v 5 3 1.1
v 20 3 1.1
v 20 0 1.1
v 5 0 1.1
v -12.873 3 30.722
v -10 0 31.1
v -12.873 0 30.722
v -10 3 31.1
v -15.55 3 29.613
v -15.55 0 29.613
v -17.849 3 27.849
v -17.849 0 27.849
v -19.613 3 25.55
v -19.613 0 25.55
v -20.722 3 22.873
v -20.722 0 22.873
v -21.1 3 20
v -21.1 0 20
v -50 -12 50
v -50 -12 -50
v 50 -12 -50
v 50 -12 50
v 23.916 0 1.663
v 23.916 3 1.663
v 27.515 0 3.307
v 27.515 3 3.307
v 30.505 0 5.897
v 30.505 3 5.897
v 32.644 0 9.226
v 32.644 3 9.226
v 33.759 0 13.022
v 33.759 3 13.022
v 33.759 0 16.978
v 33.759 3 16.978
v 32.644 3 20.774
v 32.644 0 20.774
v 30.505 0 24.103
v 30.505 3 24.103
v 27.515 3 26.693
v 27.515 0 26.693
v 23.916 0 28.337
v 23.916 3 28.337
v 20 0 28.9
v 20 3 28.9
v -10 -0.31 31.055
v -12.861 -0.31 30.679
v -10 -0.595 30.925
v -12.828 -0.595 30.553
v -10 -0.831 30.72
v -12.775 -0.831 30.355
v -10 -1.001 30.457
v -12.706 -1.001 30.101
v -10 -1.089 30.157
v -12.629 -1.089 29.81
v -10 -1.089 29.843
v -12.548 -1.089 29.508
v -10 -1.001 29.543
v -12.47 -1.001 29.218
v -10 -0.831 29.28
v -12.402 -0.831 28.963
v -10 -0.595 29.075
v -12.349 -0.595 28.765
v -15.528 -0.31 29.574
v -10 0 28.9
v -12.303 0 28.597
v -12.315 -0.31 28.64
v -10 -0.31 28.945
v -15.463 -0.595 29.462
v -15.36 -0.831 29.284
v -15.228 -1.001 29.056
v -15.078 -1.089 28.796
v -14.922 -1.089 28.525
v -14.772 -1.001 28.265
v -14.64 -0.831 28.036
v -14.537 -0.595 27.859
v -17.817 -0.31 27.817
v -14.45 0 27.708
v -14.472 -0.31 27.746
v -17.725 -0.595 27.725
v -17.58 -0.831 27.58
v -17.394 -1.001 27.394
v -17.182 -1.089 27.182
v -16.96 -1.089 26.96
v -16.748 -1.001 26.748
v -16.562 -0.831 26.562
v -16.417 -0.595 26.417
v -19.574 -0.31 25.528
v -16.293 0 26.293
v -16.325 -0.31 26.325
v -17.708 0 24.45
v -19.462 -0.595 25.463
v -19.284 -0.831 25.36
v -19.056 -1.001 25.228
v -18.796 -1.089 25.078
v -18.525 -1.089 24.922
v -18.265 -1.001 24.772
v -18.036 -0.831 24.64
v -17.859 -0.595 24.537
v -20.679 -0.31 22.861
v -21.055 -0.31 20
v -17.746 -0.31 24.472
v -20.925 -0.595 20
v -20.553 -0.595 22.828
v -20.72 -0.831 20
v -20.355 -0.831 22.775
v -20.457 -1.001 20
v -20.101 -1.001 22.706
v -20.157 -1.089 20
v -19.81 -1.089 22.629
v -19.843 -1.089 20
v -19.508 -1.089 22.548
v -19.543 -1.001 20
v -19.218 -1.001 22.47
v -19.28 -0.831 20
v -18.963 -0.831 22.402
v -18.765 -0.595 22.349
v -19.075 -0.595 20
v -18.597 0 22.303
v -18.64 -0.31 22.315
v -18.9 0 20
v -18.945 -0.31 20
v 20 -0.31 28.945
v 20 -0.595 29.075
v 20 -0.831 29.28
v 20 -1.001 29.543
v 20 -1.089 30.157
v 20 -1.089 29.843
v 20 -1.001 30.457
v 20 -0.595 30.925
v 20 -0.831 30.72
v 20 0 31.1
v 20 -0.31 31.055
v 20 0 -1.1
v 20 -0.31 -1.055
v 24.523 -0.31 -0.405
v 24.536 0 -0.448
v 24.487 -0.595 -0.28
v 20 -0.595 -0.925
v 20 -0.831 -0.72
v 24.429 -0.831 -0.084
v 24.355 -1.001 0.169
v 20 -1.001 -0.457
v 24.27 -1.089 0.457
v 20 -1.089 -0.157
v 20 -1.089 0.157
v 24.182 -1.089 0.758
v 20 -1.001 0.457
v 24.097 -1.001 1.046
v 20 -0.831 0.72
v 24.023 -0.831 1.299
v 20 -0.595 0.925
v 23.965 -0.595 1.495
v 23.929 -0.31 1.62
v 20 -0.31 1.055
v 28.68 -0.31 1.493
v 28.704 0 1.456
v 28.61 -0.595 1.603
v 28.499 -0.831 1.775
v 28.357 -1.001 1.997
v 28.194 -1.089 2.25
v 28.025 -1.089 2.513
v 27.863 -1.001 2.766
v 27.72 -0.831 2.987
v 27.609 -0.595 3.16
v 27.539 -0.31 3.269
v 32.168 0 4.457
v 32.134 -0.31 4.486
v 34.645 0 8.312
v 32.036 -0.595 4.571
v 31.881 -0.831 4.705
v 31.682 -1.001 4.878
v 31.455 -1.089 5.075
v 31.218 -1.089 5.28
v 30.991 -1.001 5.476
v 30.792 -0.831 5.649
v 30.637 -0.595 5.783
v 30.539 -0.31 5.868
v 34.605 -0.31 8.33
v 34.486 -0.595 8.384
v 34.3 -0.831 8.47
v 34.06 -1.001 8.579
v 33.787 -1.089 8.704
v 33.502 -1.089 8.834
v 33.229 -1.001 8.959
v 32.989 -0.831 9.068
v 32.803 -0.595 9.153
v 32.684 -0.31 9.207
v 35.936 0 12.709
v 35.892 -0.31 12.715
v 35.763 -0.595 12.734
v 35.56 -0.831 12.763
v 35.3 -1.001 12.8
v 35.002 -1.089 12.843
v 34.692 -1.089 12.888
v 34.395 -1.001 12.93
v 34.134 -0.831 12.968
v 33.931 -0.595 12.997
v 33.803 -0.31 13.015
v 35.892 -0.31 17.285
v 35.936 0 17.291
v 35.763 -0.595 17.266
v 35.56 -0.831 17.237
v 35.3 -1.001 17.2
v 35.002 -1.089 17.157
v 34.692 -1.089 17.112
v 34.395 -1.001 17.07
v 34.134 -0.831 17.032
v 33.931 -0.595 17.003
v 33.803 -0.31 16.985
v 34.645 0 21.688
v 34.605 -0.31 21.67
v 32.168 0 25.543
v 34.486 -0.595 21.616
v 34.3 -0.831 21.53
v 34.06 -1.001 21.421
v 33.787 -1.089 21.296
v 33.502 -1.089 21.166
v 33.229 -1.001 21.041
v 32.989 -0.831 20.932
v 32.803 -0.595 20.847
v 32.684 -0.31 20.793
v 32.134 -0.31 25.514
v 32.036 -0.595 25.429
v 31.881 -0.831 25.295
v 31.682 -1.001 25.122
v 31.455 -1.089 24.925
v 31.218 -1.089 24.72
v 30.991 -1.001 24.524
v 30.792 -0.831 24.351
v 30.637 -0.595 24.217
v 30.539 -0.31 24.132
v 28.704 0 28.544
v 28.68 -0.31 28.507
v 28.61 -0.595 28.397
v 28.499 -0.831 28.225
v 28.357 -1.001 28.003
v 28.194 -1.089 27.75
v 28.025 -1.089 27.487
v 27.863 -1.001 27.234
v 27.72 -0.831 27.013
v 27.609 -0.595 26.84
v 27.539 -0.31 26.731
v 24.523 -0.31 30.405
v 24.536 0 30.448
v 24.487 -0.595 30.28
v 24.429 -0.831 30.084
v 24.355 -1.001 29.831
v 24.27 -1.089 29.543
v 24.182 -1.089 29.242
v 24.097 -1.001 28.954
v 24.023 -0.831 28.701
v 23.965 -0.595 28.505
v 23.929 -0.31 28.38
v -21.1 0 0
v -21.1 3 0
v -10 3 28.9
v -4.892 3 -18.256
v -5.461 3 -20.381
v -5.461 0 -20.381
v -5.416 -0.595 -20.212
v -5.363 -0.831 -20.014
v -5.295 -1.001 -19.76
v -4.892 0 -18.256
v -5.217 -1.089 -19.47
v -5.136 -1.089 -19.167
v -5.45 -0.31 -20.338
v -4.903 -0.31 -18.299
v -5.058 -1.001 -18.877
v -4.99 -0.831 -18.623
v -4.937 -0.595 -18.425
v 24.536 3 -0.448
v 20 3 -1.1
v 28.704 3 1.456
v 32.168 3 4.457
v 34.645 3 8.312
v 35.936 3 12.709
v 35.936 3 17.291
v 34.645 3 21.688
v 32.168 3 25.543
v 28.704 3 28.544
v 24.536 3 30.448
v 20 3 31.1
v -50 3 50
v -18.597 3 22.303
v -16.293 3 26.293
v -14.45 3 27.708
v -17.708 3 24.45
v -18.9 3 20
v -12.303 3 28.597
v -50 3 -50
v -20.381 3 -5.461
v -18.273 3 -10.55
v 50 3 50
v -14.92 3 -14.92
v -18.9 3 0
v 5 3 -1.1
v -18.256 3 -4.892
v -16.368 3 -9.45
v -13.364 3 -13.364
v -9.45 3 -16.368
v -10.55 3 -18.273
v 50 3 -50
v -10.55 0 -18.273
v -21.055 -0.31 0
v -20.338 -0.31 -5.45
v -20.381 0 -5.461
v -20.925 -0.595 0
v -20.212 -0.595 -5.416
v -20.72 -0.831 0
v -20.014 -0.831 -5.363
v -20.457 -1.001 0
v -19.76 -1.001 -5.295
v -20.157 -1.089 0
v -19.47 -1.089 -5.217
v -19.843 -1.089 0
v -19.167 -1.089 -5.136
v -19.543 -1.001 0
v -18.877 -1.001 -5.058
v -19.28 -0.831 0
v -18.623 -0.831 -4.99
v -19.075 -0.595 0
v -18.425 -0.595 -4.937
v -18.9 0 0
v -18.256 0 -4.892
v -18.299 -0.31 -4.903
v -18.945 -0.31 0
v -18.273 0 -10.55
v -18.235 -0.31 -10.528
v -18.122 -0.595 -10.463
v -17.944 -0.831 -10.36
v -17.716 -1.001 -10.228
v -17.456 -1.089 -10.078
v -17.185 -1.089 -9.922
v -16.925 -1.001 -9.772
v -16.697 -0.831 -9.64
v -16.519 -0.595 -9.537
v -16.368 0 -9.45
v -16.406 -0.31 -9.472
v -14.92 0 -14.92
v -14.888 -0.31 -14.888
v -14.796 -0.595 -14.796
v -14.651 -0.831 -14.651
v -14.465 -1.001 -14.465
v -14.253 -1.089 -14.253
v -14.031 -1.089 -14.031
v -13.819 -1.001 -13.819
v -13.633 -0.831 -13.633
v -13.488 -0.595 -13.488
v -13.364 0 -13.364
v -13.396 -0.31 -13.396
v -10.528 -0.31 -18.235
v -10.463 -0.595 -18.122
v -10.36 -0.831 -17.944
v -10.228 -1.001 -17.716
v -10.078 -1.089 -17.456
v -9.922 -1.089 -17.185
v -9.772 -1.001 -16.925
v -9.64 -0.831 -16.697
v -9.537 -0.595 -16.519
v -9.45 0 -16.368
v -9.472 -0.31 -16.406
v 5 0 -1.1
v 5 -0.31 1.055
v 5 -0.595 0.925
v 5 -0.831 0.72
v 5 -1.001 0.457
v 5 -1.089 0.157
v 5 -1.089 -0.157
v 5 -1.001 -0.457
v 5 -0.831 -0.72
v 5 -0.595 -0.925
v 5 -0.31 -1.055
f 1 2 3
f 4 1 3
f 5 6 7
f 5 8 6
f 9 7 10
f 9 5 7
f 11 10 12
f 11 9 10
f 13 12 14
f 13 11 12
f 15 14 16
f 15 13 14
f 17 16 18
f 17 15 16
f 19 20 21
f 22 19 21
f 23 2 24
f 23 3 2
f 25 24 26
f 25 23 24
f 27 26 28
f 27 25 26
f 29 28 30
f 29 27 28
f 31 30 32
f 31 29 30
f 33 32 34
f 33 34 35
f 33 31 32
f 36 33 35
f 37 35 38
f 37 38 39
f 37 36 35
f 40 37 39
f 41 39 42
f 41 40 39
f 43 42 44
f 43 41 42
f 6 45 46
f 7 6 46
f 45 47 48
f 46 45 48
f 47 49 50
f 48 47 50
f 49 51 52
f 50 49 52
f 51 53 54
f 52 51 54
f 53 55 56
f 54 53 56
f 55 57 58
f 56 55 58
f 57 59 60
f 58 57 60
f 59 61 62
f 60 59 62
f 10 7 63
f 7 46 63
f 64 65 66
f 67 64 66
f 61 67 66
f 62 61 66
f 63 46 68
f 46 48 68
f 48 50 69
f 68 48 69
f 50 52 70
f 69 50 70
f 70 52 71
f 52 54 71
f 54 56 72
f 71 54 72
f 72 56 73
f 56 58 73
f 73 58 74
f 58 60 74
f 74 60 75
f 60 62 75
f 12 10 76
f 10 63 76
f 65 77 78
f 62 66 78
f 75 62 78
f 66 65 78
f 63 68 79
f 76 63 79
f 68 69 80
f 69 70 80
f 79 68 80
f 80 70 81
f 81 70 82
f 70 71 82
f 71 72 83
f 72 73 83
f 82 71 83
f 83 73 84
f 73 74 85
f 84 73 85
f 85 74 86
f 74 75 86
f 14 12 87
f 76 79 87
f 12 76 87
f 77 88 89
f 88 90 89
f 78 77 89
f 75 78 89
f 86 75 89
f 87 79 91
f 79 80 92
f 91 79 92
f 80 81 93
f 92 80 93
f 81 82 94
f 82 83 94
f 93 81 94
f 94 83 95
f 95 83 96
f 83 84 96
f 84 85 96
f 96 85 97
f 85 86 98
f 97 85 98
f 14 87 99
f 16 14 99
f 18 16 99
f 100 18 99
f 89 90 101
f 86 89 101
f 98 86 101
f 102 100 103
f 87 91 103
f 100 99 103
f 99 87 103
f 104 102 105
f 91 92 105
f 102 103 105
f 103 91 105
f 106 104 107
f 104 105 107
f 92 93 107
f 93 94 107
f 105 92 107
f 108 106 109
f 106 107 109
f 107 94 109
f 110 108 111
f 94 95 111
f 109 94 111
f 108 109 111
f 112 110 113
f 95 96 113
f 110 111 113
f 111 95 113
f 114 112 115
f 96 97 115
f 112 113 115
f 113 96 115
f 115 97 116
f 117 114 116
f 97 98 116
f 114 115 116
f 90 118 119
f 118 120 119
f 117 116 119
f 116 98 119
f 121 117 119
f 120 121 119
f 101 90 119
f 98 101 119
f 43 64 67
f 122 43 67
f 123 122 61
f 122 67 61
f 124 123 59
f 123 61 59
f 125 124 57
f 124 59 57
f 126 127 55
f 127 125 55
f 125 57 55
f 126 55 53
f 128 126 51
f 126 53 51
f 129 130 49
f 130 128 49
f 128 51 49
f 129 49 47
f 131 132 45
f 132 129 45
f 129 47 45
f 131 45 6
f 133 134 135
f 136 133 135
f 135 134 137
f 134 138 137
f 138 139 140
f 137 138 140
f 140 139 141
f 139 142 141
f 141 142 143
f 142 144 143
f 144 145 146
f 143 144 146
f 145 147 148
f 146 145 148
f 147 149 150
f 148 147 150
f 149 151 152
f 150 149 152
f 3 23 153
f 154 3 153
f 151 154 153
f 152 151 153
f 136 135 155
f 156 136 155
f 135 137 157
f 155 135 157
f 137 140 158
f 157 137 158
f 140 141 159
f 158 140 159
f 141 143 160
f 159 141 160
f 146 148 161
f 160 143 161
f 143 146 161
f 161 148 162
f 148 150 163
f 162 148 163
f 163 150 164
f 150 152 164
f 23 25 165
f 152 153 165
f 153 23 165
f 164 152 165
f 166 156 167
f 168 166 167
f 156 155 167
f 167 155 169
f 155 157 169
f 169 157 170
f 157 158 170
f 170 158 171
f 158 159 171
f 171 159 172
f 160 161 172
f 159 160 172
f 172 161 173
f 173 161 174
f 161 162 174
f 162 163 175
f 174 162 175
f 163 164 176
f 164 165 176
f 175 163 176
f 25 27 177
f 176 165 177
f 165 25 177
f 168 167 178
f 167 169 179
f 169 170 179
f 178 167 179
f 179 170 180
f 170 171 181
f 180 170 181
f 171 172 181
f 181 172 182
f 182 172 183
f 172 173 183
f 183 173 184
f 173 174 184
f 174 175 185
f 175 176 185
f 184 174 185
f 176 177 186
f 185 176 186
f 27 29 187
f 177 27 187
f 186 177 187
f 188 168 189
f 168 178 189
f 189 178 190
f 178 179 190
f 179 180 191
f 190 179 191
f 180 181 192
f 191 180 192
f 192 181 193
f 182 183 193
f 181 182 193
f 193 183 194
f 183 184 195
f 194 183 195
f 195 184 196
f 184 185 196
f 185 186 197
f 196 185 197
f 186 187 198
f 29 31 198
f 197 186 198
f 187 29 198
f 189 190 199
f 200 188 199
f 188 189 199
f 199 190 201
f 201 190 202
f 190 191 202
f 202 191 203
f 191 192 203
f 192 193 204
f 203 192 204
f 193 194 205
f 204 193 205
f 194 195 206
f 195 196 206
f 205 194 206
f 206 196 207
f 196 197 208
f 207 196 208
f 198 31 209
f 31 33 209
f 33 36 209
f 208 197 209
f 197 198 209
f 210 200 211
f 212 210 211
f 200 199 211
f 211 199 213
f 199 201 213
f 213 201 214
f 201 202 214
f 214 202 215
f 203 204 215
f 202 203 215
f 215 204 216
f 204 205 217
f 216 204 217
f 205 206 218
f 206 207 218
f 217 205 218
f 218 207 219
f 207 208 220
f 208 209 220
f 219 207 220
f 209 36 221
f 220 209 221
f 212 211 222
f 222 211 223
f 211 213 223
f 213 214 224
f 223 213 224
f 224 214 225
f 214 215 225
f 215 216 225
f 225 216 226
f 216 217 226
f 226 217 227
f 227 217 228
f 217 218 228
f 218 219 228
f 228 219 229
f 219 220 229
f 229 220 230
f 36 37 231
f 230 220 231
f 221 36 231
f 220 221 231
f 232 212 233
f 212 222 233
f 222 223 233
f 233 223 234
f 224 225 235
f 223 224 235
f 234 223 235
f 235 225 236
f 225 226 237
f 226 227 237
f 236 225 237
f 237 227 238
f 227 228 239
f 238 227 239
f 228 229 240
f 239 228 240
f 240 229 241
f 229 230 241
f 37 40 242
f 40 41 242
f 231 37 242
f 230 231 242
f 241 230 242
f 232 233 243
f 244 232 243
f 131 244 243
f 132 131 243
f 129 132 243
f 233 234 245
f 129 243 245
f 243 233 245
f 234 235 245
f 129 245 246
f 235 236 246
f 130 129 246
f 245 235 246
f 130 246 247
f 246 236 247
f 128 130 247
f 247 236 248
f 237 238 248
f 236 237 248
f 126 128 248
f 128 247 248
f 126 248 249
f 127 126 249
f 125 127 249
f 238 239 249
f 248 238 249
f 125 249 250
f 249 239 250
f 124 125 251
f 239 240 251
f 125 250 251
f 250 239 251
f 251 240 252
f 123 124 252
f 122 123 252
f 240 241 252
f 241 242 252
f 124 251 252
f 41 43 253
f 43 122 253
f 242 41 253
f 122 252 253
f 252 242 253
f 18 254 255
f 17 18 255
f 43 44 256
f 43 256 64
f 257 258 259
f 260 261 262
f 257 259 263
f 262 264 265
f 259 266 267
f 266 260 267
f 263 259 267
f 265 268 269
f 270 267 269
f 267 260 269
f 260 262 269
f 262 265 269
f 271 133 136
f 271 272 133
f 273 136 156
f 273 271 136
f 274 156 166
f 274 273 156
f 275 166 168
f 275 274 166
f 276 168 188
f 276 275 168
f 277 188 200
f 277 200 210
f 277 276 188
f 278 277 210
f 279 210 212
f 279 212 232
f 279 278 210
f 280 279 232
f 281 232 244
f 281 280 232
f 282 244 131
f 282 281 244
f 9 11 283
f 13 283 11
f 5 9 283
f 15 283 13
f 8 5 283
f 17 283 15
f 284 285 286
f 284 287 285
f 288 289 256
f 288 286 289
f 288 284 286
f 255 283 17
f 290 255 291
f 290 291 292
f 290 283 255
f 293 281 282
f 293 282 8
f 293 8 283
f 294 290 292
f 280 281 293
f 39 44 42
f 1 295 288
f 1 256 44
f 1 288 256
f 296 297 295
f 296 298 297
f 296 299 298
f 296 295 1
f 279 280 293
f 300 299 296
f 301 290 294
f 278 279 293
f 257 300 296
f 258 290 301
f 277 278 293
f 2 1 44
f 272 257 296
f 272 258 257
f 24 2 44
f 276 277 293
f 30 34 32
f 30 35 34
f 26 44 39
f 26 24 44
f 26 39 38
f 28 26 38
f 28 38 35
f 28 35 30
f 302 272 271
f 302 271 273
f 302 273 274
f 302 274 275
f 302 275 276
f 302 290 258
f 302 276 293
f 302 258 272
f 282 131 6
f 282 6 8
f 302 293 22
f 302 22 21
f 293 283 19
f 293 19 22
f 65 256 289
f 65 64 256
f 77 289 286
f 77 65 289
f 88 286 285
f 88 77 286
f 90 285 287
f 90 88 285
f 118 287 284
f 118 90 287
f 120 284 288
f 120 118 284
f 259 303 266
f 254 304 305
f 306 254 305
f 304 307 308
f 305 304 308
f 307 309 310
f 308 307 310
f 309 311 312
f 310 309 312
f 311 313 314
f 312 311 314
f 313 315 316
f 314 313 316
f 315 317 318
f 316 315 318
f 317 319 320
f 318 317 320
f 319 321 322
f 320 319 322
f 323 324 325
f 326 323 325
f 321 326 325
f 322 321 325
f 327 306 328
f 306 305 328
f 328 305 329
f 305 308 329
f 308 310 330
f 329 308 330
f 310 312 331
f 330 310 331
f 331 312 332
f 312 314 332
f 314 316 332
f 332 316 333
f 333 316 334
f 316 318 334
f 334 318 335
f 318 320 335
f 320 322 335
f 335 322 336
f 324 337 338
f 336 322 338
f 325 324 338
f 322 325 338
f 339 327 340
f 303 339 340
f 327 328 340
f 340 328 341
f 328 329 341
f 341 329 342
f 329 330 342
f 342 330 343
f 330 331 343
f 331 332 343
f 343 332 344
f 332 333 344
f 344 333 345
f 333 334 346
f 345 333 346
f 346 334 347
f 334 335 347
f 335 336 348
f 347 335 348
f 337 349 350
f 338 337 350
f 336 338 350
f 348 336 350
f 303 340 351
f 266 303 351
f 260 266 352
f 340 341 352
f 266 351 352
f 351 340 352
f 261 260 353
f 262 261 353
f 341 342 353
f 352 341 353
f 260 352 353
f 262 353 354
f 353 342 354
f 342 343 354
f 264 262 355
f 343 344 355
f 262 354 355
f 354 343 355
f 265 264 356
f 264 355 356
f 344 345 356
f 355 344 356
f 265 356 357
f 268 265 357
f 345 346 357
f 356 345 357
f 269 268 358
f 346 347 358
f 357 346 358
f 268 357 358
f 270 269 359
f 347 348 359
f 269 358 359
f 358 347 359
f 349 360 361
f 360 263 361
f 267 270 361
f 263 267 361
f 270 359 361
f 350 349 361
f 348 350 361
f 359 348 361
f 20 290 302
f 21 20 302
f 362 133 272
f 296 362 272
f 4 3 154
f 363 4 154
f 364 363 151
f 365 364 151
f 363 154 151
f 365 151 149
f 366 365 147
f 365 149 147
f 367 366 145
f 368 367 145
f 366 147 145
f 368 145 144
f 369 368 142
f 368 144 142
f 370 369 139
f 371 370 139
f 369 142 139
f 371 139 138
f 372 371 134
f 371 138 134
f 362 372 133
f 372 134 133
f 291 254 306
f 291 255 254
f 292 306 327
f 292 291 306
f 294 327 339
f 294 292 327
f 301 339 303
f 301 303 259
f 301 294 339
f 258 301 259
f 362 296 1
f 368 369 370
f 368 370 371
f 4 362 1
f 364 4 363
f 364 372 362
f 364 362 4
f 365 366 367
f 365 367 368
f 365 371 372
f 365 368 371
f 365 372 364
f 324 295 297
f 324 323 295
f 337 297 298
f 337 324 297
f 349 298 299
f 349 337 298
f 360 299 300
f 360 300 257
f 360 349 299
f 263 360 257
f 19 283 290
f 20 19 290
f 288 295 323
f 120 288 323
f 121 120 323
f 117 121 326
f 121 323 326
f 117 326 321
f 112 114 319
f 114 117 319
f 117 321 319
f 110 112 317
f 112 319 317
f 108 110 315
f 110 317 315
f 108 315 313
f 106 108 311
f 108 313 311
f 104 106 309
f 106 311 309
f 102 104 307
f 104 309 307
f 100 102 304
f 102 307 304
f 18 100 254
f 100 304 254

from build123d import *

# Parameters (mm, degrees)
AUFSATZ_LINEAR_START            = 3
SKIZZE4_W                       = 100
SKIZZE4_H                       = 100
AUFSATZ_LINEAR_AUSTRAGEN1_DEPTH = 15


with BuildPart() as part:
    # Skizze4 → Aufsatz-Linear austragen1 (new body)
    with BuildSketch(Plane(origin=(0, 0, 0), x_dir=(1, 0, 0), z_dir=(0, 1, 0)).offset(AUFSATZ_LINEAR_START)):
        Rectangle(SKIZZE4_W, SKIZZE4_H)
    extrude(amount=-AUFSATZ_LINEAR_AUSTRAGEN1_DEPTH)

    # Schnitt-Austragung1: sweep along a path in Skizze1_2
    with BuildLine(Plane(origin=(0, 0, 0), x_dir=(1, 0, 0), z_dir=(0, 1, 0))) as schnitt_austragung1_path:
        Line((5, 0), (20, 0))
        ThreePointArc((20, 0), (35, -15), (20, -30))
        Line((20, -30), (-10, -30))
        ThreePointArc((-10, -30), (-17.071067812, -27.071067812), (-20, -20))
        Line((-20, -20), (-20, 0))
        ThreePointArc((-20, 0), (-15.867066806, 12.17522858), (-5.176380902, 19.318516526))
    # Skizze5 → Schnitt-Austragung1 (sweep, cut)
    with BuildSketch(Plane(origin=(0, 0, 0), x_dir=(-0.258819045, 0, -0.965925826), z_dir=(0.965925826, 0, -0.258819045))):
        with BuildLine():
            Line((21.1, 0), (21.1, 3))
            Line((21.1, 3), (18.9, 3))
            Line((18.9, 3), (18.9, 0))
            ThreePointArc((18.9, 0), (20, -1.1), (21.1, 0))
        make_face()
    sweep(path=schnitt_austragung1_path.line, mode=Mode.SUBTRACT)


solid = part.part
